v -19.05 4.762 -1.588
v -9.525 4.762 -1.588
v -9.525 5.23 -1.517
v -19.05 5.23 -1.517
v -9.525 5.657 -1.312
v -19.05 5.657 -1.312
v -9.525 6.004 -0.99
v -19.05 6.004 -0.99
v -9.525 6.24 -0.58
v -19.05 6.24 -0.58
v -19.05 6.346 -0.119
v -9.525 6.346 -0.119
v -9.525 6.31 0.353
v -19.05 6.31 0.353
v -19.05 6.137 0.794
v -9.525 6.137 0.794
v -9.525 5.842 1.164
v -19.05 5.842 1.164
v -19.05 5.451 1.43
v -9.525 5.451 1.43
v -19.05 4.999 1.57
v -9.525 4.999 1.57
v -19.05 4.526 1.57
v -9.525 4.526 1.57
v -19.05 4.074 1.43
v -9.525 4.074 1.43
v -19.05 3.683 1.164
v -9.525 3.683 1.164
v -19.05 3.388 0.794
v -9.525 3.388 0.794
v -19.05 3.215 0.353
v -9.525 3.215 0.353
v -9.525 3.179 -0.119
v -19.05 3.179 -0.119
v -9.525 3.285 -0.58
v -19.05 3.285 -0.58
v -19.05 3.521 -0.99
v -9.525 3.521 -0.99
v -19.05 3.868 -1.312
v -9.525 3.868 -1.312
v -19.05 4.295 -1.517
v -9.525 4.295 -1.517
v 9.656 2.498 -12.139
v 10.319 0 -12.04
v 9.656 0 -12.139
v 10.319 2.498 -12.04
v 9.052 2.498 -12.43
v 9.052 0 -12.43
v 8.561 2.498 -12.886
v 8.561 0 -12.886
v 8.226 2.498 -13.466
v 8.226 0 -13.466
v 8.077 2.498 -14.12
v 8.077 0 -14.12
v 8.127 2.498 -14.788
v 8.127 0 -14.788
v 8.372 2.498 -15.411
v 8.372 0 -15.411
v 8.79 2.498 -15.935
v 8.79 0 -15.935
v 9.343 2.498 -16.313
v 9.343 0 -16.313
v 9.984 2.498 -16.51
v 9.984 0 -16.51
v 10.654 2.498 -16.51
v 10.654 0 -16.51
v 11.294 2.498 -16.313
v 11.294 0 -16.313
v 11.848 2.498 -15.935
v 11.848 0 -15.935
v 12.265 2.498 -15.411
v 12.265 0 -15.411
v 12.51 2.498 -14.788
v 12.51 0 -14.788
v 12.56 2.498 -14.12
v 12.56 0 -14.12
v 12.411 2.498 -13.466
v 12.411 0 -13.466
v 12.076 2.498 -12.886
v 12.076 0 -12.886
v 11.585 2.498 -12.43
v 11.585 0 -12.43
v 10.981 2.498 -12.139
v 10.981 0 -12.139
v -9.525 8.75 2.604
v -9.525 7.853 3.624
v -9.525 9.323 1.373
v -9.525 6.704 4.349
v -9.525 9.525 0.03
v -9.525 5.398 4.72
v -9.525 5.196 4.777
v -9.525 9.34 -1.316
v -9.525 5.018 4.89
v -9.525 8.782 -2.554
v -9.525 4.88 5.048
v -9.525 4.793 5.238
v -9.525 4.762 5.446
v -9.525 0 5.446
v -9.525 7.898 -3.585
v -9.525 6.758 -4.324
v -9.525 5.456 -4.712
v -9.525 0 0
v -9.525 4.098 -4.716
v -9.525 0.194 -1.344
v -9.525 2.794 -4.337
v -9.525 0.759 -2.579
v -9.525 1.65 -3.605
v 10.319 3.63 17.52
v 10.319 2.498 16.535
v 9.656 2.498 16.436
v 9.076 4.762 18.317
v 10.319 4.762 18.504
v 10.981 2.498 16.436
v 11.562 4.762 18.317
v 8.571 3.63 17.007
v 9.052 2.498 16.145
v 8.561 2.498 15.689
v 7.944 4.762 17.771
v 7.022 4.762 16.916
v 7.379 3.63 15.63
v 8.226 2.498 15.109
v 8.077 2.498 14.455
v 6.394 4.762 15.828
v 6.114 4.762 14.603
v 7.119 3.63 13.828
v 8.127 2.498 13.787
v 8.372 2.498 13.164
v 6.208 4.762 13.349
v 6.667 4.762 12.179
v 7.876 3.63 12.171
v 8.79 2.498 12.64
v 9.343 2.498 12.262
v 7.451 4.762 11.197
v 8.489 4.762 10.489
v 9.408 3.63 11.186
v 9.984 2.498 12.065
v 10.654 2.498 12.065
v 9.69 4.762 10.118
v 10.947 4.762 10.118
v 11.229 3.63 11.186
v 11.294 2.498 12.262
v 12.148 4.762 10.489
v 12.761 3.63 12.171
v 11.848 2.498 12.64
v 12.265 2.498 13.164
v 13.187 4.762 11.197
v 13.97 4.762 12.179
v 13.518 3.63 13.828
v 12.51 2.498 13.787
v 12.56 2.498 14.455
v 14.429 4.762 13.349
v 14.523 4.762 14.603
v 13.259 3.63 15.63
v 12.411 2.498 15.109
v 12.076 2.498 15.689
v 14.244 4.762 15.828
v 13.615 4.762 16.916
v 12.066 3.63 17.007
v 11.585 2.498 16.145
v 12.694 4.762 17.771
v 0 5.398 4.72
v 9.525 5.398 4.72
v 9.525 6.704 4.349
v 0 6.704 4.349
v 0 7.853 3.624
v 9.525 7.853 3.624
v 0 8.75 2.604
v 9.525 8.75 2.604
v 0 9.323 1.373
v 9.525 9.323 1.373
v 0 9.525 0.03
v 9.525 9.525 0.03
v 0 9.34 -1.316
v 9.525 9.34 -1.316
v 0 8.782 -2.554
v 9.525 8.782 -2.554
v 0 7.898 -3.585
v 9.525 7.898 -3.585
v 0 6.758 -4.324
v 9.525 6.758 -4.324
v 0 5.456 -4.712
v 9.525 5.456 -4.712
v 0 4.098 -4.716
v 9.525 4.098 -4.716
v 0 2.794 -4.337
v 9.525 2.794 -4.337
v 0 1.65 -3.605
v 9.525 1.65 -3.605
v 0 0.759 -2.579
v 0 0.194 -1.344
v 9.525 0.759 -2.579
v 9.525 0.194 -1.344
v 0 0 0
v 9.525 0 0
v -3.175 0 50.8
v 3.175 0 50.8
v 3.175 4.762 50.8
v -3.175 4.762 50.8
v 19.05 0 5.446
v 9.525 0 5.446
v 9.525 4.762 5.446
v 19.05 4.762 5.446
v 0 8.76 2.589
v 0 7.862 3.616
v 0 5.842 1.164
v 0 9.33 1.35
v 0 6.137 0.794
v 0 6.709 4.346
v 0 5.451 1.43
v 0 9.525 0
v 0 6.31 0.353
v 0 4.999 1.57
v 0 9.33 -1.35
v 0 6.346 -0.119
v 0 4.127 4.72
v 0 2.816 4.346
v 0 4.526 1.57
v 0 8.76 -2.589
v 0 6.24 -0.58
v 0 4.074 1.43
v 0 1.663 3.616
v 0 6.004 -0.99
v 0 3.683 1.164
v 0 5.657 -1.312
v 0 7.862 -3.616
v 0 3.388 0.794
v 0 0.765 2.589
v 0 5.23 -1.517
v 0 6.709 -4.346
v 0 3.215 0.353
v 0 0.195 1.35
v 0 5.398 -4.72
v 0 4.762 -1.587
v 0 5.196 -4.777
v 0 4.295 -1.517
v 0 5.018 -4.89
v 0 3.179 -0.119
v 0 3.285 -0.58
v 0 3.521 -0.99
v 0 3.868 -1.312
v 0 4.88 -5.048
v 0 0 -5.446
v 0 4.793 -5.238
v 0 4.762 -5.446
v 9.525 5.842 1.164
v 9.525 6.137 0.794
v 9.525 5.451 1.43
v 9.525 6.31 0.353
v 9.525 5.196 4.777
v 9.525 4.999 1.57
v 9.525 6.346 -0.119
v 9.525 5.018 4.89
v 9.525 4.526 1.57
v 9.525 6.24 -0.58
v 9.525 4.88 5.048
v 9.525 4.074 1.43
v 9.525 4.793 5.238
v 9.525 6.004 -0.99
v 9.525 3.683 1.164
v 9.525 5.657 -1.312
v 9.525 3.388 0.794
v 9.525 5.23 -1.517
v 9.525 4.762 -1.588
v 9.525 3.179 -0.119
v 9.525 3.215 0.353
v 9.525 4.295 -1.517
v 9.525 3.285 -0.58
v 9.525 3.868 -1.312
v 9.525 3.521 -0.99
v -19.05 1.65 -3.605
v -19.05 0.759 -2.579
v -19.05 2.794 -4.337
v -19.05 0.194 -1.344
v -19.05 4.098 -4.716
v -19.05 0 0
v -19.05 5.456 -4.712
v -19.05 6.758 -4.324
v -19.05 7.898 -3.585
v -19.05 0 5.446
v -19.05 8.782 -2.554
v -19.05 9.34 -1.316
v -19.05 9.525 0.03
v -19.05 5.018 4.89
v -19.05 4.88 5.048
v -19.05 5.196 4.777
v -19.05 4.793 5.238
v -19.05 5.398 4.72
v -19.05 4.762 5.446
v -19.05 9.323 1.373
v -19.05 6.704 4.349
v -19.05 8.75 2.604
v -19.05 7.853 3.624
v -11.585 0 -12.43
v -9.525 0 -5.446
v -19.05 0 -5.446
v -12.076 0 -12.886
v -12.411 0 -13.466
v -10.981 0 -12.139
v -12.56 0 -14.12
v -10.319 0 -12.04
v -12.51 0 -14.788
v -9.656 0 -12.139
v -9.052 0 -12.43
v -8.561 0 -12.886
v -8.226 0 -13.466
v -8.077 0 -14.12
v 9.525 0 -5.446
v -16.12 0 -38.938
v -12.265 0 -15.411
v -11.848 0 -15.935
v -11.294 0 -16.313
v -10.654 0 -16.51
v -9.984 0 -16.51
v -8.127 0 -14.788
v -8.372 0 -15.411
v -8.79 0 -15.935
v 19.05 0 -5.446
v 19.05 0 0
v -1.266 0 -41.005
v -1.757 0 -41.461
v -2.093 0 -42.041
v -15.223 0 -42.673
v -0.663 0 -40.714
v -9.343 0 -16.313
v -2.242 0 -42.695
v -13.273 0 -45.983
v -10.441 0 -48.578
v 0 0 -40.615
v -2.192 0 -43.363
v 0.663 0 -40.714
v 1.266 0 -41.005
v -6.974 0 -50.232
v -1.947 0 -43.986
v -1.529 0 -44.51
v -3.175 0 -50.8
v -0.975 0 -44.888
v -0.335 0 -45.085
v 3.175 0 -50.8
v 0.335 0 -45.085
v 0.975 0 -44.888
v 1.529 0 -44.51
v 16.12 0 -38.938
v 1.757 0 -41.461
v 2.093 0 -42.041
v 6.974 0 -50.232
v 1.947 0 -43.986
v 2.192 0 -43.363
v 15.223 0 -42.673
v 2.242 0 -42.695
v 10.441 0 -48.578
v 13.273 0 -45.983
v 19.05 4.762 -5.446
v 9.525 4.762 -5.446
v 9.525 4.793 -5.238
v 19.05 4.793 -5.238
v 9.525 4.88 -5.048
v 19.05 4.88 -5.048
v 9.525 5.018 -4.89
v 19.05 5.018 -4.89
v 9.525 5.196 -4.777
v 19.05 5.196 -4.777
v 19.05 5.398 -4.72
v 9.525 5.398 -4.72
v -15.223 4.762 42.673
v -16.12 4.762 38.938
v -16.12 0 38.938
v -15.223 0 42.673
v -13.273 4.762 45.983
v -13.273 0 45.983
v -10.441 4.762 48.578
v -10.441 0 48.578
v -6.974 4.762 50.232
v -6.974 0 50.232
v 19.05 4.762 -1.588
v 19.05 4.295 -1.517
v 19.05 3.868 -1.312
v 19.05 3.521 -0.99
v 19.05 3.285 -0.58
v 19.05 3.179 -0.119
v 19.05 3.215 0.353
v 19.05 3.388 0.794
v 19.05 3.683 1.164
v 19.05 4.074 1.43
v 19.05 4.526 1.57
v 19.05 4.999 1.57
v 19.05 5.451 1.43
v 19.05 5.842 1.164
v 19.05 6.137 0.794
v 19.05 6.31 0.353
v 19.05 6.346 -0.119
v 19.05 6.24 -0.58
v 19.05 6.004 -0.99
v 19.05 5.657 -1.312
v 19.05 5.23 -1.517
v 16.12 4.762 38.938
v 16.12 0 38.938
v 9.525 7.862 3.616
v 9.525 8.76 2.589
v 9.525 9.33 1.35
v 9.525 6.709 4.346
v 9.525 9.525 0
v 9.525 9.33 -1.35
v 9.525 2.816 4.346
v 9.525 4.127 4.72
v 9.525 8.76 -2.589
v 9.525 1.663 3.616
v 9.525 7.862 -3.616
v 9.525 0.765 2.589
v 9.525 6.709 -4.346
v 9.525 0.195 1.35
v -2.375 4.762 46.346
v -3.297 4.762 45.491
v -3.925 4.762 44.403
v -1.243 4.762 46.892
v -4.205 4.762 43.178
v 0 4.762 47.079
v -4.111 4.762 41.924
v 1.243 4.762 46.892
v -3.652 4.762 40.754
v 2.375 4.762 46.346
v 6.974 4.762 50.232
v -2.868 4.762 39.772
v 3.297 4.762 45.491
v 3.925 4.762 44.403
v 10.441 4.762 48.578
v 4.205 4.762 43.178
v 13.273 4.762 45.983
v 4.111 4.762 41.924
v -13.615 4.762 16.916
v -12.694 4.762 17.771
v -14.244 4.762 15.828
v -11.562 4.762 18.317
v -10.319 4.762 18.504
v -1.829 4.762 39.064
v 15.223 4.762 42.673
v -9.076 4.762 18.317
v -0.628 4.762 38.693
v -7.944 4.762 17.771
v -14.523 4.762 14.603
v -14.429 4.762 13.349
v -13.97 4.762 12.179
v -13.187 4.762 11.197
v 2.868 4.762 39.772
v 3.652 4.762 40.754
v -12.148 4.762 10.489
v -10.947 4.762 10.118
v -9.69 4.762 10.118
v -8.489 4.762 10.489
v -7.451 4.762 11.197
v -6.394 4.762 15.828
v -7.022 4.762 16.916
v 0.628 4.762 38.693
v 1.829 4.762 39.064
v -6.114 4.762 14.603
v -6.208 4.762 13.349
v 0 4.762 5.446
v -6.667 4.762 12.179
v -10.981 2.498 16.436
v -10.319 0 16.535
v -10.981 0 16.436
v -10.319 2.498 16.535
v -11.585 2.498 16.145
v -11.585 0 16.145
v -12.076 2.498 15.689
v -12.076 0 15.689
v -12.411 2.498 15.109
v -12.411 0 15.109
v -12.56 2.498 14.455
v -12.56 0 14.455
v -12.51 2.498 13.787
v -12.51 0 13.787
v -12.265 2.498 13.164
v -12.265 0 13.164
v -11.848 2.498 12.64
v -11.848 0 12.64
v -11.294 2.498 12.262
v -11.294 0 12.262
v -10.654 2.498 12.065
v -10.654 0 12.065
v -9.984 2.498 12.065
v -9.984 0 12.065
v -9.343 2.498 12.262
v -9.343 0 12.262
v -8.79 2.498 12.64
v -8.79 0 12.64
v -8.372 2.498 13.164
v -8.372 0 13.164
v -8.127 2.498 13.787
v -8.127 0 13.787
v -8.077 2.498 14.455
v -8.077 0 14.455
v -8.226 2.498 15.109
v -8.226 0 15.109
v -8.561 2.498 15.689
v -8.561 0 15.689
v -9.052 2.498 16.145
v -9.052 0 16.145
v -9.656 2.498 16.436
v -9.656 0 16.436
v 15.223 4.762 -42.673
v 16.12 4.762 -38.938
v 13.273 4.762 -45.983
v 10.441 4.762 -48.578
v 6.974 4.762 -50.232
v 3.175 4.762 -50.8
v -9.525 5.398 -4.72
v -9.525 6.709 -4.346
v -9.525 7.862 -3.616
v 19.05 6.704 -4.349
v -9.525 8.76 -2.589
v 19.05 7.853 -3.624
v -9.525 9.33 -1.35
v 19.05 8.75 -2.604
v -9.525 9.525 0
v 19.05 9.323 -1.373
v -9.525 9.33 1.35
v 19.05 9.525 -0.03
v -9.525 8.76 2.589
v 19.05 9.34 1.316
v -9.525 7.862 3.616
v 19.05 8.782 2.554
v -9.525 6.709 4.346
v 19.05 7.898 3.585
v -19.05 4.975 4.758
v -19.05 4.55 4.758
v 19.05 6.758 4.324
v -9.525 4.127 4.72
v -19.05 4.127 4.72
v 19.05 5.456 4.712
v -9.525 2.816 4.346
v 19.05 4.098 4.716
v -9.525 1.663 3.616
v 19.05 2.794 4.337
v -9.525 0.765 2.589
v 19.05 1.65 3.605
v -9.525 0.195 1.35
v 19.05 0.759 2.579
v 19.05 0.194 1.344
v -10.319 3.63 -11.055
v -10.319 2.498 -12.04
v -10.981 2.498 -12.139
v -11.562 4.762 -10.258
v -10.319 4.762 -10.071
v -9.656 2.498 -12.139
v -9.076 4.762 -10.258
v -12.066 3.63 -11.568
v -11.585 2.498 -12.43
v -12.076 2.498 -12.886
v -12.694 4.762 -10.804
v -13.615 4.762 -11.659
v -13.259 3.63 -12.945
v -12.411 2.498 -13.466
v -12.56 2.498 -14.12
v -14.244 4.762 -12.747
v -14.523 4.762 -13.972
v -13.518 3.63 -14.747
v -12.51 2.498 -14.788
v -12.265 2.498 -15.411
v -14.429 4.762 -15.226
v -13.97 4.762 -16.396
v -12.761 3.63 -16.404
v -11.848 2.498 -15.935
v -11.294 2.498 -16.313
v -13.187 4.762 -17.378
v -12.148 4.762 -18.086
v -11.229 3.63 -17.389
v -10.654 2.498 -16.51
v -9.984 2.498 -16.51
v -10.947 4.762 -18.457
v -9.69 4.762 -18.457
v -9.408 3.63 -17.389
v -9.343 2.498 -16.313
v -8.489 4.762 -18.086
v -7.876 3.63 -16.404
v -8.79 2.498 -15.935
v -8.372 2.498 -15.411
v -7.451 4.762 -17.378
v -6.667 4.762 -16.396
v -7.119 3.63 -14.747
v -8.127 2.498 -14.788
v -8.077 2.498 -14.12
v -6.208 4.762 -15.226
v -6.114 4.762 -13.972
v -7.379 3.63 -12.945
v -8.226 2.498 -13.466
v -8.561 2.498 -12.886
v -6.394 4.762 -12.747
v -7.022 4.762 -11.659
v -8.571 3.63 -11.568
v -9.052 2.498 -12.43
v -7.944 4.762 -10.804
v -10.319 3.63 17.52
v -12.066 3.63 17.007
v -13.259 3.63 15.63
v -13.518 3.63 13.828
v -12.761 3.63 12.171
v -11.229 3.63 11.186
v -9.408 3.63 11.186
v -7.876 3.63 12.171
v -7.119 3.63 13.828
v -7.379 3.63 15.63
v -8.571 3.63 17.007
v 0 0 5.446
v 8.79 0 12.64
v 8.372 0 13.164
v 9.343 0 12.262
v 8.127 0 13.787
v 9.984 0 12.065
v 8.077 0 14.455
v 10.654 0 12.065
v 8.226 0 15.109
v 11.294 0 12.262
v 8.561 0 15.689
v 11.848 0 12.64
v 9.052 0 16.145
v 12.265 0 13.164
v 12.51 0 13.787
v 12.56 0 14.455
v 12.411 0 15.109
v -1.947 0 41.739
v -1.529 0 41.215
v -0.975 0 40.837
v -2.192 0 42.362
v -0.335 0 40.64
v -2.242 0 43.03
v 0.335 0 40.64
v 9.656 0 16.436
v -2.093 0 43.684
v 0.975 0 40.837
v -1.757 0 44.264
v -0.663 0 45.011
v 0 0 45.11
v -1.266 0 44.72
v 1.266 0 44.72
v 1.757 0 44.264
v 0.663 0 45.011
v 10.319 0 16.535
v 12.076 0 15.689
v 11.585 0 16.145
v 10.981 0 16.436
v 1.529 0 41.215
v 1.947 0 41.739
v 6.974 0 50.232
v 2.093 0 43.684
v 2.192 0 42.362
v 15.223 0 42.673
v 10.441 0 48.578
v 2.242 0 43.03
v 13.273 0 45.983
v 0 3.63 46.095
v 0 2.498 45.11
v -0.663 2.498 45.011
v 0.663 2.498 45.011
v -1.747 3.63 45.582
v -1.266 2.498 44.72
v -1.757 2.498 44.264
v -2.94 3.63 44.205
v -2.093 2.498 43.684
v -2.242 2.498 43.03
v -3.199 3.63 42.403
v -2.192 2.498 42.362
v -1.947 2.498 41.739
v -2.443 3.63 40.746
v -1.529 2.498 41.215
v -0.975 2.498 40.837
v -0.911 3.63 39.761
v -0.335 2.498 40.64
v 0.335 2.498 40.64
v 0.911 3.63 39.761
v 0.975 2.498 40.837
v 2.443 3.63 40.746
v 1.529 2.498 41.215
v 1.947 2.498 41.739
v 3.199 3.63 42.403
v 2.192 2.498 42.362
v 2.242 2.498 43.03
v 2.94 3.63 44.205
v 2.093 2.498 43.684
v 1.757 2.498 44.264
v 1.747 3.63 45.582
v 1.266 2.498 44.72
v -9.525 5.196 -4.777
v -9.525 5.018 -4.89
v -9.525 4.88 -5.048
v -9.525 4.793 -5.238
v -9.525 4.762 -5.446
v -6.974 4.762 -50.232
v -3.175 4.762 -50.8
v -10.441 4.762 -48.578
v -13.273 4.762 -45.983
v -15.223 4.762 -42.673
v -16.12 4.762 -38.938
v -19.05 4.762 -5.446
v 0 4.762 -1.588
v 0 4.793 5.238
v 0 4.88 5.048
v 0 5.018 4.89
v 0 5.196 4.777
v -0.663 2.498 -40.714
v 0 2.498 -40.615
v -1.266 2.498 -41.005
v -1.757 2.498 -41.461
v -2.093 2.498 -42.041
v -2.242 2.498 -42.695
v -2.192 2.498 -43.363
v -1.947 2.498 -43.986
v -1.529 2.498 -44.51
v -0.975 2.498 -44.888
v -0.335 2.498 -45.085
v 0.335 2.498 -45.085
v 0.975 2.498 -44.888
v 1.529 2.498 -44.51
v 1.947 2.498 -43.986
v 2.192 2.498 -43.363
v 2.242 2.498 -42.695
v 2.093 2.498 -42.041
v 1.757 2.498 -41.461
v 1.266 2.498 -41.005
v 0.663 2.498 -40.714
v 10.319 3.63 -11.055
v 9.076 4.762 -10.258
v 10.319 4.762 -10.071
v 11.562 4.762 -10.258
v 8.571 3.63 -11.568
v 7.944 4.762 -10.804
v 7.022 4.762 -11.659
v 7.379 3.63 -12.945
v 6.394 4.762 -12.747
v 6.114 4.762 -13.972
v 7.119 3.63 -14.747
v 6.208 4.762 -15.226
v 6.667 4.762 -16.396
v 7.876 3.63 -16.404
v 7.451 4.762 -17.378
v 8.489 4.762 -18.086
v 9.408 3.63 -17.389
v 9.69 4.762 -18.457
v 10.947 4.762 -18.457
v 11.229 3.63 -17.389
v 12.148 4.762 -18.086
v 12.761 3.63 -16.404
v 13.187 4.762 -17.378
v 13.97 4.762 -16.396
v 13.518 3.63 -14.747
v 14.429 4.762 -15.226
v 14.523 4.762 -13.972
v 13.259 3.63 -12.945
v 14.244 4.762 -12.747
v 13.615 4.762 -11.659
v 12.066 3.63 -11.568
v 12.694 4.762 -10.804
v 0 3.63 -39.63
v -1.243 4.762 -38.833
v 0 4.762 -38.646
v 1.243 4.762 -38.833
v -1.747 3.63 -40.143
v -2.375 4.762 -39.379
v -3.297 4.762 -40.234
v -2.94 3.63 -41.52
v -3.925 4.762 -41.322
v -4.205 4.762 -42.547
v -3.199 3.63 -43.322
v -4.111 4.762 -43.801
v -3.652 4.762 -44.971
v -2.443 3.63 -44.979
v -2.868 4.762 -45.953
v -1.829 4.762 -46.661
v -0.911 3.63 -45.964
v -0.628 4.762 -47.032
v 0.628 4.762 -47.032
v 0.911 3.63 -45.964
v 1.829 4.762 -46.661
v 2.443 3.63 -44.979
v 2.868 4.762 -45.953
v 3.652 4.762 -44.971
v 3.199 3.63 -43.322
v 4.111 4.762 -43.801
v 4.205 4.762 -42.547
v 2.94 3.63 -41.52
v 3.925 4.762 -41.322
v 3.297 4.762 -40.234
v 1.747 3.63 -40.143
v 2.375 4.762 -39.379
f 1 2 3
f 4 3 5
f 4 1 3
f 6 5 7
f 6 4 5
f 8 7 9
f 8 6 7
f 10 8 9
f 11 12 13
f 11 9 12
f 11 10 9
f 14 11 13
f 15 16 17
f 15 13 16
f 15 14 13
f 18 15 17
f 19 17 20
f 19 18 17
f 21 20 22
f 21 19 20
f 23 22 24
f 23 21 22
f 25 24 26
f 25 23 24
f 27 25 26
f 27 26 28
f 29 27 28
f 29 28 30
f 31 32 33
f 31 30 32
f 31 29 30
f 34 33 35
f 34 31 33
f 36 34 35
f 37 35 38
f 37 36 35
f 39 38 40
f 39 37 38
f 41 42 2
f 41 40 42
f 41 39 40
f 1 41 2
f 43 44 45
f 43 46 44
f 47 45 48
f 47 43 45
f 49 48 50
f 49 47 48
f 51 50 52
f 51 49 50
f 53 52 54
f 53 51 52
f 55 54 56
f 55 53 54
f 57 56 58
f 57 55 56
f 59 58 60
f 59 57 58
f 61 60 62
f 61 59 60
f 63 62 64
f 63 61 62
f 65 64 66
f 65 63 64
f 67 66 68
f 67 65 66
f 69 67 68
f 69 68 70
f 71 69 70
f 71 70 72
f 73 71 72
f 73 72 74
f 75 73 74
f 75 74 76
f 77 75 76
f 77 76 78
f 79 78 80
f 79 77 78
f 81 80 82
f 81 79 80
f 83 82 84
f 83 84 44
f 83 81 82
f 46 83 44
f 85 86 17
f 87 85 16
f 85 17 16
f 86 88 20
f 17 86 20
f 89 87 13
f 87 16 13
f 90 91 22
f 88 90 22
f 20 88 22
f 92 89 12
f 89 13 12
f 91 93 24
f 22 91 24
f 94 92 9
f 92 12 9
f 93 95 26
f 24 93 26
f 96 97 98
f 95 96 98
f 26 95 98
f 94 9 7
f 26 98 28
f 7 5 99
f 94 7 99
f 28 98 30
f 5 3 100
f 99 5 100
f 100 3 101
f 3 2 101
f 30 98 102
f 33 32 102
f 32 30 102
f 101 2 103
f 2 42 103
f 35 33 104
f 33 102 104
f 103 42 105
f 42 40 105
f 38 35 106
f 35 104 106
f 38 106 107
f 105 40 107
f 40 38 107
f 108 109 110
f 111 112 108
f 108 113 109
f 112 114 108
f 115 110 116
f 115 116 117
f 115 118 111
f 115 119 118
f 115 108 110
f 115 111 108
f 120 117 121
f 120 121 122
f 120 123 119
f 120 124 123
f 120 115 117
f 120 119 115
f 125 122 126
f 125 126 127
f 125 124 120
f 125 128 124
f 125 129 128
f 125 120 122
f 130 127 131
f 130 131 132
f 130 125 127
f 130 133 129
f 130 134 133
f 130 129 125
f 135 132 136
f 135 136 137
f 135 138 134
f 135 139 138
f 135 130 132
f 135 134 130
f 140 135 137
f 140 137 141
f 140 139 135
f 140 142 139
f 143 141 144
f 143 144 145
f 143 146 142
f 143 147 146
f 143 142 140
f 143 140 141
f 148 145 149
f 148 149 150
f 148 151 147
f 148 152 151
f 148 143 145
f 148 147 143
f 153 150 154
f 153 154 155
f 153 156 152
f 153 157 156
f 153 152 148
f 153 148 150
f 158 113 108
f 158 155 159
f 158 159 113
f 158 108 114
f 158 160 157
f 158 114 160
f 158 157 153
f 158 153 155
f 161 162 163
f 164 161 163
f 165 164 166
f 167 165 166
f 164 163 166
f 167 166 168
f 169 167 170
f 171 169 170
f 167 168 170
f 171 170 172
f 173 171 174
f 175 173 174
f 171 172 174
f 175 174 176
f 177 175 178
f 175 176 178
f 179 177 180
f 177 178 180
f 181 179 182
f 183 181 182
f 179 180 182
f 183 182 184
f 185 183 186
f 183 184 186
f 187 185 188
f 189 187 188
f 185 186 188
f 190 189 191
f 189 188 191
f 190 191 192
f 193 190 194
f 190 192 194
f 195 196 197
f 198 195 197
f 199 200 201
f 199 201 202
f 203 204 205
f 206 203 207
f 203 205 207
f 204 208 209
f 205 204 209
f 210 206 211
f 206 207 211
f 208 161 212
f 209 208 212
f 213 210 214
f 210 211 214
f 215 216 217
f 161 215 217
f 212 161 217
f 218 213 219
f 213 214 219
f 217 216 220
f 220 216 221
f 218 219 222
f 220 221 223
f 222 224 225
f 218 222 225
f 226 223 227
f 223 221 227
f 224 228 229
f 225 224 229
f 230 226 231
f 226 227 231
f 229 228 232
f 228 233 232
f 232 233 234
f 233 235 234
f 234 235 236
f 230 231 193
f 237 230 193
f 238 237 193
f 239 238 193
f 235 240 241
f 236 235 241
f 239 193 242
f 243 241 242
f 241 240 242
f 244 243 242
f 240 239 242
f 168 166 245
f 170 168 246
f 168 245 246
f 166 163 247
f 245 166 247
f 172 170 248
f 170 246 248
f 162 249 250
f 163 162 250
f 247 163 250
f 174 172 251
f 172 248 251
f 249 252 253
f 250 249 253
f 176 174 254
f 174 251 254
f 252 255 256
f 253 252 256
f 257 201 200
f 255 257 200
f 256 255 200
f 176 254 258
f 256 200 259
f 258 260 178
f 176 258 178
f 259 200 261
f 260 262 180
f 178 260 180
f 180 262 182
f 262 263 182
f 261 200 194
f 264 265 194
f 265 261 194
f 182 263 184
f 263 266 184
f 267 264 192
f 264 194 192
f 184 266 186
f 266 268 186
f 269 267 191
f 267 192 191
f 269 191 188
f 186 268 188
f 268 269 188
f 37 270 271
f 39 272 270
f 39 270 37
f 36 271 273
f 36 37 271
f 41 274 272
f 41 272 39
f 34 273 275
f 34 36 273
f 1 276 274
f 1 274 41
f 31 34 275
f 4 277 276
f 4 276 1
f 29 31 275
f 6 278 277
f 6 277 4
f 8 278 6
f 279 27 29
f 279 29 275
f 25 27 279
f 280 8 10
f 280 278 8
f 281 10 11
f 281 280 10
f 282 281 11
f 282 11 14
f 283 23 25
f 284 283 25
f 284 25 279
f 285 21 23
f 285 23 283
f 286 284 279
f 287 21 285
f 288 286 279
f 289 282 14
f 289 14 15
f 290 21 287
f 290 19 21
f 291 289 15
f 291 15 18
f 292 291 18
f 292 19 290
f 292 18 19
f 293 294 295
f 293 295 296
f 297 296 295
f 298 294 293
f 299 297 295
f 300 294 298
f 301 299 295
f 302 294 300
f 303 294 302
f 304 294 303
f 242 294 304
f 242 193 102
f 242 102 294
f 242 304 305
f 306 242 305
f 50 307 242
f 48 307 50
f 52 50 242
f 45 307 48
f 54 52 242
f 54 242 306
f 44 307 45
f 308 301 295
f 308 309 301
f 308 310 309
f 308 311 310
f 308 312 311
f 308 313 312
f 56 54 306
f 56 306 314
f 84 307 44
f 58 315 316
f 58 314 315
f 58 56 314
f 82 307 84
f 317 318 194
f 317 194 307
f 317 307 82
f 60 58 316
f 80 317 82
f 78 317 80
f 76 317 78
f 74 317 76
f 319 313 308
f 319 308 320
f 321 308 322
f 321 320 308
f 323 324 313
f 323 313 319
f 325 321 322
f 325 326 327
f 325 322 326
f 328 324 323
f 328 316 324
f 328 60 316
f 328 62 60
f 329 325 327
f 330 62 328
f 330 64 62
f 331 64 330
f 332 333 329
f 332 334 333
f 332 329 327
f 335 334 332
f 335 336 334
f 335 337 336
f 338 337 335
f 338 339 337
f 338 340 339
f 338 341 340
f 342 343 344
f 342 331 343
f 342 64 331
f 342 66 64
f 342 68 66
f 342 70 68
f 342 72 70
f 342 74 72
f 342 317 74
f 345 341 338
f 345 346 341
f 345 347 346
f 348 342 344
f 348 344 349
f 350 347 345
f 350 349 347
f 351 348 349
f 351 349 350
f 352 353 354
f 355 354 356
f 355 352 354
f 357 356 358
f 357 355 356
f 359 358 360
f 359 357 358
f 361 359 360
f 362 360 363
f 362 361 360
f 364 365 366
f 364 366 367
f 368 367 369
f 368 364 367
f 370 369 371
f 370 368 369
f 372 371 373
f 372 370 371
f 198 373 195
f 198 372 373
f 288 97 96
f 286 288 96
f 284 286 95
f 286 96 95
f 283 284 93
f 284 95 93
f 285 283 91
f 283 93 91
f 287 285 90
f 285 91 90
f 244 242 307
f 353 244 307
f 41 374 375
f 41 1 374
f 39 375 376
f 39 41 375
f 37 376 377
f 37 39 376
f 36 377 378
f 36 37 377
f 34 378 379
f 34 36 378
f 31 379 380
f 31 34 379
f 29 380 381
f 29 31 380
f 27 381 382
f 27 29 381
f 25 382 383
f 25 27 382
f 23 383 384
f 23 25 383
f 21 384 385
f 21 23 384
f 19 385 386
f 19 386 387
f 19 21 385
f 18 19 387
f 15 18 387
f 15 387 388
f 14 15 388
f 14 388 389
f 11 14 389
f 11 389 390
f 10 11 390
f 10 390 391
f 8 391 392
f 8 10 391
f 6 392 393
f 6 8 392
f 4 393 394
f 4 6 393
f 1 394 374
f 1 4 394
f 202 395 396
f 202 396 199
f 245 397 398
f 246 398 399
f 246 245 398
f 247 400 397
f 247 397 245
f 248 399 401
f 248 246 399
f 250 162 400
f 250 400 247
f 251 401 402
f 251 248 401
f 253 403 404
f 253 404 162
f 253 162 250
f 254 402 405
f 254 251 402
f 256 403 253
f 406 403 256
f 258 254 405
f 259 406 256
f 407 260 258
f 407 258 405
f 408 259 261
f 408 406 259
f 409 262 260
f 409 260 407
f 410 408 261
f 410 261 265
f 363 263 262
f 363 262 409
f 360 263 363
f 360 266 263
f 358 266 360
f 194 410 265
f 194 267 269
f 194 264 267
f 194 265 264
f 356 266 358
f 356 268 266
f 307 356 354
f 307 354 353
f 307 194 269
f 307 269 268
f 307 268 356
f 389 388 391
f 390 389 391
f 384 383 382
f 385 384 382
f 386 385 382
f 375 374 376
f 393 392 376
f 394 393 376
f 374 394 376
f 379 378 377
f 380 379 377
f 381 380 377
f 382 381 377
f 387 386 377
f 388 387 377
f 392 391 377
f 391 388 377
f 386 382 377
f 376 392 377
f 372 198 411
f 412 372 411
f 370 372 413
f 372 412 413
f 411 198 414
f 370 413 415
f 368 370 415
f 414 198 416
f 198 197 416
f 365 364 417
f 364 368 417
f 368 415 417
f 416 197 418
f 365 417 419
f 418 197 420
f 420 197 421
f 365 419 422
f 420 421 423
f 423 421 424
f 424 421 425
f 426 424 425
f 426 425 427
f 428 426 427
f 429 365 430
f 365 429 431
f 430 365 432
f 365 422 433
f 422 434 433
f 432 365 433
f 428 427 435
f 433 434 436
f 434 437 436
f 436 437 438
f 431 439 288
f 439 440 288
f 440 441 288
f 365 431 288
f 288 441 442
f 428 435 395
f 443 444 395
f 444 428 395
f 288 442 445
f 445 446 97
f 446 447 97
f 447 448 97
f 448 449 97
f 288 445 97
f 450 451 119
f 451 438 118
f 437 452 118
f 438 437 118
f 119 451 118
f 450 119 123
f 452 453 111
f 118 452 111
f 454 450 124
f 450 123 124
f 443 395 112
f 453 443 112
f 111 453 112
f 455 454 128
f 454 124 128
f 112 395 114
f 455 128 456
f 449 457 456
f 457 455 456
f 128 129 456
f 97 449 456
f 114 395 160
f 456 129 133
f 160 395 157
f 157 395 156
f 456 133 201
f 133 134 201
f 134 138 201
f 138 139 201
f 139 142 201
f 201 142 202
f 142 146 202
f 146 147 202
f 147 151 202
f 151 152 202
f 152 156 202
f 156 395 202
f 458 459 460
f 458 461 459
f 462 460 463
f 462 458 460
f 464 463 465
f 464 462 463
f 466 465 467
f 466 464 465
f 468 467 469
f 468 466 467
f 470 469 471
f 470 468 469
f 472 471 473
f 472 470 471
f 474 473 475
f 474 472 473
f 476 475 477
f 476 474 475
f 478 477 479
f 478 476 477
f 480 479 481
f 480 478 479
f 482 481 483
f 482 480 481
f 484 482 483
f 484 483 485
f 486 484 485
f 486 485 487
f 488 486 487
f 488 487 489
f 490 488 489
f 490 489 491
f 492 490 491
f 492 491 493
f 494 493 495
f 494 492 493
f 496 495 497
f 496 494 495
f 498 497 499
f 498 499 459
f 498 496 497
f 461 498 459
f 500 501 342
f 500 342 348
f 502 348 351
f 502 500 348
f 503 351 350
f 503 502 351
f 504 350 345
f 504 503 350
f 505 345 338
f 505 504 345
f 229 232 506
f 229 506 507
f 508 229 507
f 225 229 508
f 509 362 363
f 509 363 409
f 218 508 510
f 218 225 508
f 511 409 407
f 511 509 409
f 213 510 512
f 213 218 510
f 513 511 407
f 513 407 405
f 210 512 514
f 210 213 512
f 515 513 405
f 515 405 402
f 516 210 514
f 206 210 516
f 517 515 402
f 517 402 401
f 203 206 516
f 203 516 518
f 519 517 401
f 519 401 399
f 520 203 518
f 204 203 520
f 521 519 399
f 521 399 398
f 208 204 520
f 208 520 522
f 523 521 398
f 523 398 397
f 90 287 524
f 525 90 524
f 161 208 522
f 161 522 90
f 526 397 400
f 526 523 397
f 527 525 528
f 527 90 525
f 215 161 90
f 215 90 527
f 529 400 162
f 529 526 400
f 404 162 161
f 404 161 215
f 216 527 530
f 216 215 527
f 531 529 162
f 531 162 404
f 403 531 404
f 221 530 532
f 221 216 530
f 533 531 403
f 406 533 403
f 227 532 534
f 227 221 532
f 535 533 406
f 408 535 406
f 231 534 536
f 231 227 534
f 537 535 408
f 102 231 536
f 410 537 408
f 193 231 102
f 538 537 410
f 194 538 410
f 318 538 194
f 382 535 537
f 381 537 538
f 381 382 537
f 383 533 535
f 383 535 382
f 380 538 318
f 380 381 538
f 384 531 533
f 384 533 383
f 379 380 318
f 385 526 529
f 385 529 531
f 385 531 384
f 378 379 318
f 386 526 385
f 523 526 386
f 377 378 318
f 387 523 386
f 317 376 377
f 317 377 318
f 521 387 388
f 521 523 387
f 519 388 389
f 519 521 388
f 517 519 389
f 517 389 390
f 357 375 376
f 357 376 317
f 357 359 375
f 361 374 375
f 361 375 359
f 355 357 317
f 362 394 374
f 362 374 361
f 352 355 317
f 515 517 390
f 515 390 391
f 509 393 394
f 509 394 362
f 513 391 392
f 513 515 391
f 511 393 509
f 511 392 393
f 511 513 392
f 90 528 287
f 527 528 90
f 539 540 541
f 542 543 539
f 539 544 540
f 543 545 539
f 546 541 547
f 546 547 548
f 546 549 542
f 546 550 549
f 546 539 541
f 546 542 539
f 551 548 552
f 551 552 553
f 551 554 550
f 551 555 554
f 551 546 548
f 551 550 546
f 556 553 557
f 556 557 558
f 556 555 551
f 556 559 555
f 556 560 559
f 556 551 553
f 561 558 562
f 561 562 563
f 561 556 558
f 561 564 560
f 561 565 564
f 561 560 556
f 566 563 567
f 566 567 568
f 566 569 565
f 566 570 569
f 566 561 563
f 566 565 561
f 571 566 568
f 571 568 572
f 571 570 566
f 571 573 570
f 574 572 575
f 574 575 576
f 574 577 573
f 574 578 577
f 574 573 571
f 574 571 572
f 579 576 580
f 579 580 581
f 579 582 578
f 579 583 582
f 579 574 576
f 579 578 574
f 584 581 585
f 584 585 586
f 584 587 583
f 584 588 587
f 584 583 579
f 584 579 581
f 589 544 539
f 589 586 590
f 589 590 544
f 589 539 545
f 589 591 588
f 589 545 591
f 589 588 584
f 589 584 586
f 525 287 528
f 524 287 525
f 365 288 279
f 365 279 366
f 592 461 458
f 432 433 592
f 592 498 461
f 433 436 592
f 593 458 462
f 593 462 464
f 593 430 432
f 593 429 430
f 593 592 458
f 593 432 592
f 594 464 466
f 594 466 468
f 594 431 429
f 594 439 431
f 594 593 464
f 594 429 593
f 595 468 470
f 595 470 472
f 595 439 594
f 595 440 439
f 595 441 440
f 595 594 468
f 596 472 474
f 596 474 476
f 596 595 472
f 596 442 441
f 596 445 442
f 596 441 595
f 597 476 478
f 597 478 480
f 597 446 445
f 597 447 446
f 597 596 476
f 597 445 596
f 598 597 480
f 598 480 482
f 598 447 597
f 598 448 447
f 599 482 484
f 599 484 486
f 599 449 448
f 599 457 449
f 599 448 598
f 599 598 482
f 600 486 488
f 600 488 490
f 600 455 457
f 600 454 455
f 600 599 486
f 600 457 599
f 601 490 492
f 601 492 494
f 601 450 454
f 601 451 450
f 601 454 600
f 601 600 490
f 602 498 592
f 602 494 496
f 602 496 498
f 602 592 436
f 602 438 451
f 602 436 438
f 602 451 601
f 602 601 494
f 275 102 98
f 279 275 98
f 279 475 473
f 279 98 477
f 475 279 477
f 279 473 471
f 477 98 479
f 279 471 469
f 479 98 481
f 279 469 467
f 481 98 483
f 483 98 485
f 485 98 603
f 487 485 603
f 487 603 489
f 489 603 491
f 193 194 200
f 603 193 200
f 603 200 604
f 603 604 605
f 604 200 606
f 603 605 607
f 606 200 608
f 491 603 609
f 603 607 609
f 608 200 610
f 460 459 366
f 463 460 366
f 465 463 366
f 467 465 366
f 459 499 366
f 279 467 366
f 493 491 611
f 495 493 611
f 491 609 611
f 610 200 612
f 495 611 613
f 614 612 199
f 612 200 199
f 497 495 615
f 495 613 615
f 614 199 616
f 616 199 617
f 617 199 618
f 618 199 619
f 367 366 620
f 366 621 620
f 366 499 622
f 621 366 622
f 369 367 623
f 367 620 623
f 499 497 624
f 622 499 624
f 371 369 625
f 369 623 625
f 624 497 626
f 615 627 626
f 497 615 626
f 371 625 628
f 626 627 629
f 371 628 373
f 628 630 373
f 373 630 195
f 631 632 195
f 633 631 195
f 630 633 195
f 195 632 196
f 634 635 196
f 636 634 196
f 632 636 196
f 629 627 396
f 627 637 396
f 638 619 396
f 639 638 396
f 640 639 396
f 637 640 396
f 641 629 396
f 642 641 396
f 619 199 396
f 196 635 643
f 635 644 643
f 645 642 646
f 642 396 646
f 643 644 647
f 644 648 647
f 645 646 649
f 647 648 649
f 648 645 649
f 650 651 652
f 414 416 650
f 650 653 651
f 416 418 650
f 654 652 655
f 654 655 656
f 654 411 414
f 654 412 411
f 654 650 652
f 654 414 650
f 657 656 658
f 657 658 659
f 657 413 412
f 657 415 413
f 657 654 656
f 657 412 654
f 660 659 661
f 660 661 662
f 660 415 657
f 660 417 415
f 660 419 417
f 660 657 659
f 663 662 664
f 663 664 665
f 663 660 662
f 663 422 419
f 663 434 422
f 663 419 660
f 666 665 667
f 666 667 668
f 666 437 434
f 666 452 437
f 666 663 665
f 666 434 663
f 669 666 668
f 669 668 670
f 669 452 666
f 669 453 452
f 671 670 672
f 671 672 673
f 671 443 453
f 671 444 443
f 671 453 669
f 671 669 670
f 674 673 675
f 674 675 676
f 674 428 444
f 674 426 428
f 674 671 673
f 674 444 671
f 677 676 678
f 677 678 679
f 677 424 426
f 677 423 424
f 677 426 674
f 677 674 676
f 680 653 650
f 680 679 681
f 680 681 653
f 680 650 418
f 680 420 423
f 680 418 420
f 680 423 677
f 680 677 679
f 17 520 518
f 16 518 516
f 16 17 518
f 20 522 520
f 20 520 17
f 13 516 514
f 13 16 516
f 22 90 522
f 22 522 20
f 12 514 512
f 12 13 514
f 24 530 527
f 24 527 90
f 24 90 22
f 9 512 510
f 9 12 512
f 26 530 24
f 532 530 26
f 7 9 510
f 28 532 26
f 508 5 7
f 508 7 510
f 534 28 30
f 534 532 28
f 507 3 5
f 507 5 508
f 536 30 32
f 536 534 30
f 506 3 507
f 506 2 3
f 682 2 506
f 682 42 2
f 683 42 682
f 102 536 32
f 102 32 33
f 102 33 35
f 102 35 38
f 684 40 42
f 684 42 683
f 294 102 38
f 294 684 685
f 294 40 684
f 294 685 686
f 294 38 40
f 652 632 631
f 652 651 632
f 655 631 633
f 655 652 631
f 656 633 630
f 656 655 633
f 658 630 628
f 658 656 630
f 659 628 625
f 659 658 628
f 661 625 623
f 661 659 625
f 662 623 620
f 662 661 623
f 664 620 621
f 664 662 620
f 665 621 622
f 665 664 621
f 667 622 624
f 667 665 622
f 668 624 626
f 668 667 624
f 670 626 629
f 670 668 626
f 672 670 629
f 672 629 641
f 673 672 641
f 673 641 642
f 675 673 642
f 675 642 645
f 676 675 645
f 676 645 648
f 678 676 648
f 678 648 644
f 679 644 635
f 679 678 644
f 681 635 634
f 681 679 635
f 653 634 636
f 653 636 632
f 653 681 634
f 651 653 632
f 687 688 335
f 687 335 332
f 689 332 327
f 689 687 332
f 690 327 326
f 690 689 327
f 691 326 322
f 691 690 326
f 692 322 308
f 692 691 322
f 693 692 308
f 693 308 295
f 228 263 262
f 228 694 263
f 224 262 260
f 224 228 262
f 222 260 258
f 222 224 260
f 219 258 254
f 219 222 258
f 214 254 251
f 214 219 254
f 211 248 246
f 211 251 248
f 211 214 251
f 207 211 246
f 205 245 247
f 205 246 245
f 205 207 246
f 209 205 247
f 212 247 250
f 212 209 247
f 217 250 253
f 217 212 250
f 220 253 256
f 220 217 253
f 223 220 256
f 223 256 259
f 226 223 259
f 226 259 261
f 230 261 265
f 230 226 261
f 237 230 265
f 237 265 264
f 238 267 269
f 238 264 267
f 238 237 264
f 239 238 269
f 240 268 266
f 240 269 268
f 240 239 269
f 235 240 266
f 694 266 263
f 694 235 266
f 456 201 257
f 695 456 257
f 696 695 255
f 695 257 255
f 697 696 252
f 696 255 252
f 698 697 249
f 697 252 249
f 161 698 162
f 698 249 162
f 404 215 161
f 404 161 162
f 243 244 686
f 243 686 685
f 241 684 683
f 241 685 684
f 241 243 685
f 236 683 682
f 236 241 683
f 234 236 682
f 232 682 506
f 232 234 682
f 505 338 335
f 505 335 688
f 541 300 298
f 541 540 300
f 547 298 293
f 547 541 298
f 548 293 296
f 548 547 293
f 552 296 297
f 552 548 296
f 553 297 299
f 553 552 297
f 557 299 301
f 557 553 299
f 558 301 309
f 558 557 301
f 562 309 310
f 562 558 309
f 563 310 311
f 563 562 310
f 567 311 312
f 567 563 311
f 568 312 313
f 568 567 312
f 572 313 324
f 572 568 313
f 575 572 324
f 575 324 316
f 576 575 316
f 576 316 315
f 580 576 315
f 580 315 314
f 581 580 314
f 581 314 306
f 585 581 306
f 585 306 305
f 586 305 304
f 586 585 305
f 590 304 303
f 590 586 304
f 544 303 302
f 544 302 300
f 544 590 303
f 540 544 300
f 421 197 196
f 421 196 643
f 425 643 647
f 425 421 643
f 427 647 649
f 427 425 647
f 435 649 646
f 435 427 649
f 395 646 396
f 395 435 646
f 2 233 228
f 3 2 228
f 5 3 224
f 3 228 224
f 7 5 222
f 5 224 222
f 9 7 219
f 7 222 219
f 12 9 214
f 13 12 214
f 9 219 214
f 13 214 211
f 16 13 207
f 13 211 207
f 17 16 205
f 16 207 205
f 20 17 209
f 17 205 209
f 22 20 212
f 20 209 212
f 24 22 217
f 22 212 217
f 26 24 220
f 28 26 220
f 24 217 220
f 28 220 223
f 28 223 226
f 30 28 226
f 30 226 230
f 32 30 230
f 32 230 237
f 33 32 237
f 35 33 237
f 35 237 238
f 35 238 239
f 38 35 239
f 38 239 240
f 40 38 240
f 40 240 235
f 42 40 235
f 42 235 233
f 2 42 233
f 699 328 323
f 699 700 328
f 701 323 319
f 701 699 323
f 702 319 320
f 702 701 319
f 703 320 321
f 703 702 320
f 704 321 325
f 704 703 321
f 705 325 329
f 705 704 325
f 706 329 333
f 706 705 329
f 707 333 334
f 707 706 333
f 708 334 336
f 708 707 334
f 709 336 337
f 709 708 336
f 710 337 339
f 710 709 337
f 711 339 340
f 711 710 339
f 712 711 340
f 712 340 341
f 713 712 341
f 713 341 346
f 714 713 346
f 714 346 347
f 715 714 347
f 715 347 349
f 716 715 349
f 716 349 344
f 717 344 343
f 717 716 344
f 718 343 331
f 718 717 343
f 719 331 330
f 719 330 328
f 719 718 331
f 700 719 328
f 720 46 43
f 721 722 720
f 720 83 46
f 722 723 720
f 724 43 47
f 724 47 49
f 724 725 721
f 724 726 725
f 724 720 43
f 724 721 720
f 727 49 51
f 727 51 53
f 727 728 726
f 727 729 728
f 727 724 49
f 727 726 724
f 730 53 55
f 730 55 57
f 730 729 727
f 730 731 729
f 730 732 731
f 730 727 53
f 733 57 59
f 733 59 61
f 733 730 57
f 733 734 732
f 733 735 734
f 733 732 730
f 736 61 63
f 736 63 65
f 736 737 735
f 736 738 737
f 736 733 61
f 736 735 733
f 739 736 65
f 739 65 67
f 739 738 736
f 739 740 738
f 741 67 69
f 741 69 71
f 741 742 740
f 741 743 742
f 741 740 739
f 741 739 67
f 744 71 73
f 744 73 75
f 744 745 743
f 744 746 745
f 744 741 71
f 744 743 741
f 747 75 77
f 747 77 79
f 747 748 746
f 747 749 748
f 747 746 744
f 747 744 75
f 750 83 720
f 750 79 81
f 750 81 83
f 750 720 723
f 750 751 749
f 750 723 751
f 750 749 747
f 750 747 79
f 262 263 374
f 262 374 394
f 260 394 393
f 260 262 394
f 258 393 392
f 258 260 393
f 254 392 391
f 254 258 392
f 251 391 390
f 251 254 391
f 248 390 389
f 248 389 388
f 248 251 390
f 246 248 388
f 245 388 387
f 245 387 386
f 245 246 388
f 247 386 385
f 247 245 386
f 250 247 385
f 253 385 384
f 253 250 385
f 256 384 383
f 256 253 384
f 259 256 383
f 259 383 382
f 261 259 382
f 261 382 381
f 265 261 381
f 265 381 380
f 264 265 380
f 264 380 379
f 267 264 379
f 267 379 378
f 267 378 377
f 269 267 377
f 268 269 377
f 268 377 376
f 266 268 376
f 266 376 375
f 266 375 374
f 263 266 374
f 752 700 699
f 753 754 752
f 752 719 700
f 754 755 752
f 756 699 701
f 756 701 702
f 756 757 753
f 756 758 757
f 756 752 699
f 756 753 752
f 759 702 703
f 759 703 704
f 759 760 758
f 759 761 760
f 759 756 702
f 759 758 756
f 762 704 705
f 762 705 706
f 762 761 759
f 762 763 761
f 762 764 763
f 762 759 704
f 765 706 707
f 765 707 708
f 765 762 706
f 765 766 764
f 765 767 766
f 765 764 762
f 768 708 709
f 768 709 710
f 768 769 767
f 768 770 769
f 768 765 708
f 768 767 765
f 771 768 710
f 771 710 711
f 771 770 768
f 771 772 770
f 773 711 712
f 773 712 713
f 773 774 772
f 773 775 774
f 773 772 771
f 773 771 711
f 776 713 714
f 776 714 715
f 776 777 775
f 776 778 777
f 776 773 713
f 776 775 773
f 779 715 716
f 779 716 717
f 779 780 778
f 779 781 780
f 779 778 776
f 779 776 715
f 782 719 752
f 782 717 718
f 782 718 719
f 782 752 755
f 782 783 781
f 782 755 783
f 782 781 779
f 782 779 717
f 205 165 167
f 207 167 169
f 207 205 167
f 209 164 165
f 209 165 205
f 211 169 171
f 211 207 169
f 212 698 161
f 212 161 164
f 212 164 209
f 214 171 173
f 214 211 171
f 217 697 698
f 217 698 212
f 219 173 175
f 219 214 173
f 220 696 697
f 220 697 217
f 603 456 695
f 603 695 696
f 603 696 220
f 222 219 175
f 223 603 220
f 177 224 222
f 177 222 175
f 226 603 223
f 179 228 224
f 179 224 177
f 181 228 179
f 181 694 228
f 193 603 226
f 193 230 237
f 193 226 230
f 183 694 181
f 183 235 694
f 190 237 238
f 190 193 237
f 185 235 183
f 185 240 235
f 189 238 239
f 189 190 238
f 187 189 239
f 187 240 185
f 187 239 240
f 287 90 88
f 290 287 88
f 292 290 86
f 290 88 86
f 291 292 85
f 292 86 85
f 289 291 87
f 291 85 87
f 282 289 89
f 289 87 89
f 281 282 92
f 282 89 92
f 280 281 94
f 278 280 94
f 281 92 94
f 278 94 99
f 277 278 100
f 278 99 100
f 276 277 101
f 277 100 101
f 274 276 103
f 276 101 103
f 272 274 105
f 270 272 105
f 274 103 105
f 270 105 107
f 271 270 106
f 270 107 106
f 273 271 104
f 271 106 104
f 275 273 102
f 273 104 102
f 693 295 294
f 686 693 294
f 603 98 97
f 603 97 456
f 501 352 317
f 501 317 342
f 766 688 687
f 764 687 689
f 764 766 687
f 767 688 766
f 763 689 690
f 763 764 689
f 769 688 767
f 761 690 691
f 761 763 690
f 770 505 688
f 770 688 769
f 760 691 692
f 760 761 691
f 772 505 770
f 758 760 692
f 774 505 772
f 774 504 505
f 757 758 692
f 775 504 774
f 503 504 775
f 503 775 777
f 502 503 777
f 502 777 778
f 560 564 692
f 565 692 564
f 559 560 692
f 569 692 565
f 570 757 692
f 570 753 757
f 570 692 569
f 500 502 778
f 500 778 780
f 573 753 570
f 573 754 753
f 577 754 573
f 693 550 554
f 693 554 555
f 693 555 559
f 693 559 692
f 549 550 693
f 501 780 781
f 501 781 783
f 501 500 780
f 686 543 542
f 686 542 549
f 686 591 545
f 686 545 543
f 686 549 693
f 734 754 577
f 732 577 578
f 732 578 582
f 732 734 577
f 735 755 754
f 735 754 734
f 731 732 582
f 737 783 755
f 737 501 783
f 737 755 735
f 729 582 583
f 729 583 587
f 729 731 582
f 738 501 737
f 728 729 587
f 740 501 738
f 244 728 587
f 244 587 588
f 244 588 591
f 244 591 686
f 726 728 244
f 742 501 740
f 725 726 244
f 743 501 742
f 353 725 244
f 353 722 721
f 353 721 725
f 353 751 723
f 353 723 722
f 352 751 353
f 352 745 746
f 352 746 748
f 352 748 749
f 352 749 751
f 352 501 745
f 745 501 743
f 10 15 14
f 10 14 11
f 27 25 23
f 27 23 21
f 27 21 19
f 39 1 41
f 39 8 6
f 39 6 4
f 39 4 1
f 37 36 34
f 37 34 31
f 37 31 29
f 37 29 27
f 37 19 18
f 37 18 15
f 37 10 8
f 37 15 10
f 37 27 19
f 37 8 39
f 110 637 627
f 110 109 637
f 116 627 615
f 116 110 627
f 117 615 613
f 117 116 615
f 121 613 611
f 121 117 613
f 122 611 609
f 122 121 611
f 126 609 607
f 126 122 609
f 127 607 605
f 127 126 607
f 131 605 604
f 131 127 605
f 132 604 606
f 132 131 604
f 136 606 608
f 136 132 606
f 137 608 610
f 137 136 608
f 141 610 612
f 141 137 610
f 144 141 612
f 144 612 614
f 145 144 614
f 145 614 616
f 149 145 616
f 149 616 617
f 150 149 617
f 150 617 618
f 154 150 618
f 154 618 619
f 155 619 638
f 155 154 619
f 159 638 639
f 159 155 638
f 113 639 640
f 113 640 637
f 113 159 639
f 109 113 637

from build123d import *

# Parameters (mm, degrees)
SKETCH2_R                                     = 1.5875
EXTRUDE1_DEPTH                                = 19.05
SKETCH24_W                                    = 9.525
SKETCH24_H                                    = 10.208627108
CUT_EXTRUDE5_DEPTH                            = 10.525
SKETCH4_R                                     = 1.5875
EXTRUDE2_DEPTH                                = 19.05
EXTRUDE2_DEPTH_BACK                           = 19.05
SKETCH25_W                                    = 9.525
SKETCH25_H                                    = 10.166103935
CUT_EXTRUDE6_DEPTH                            = 10.525
SKETCH7_W                                     = 38.1
SKETCH7_H                                     = 1.5875
CUT_EXTRUDE4_DEPTH                            = 1056.132
CSK_FOR_8_FLAT_HEAD_MACHINE_SCREW1_AT_2_COUNT = 2
CSK_FOR_8_FLAT_HEAD_MACHINE_SCREW1_AT_2_PITCH = 30.381033994
CSK_FOR_8_FLAT_HEAD_MACHINE_SCREW1_AT_3_COUNT = 2
CSK_FOR_8_FLAT_HEAD_MACHINE_SCREW1_AT_3_PITCH = 30.381033994
CSK_FOR_8_FLAT_HEAD_MACHINE_SCREW1_AT_4_COUNT = 2
CSK_FOR_8_FLAT_HEAD_MACHINE_SCREW1_AT_4_PITCH = 58.074082873
CSK_FOR_8_FLAT_HEAD_MACHINE_SCREW1_AT_5_COUNT = 2
CSK_FOR_8_FLAT_HEAD_MACHINE_SCREW1_AT_5_PITCH = 58.074082873
CSK_FOR_8_FLAT_HEAD_MACHINE_SCREW1_AT_6_COUNT = 2
CSK_FOR_8_FLAT_HEAD_MACHINE_SCREW1_AT_6_PITCH = 85.725


with BuildPart() as part:
    # Sketch2 → Extrude1 (new body, symmetric)
    with BuildSketch(Plane(origin=(0, 0, 0), x_dir=(0, 0, -1), z_dir=(1, 0, 0))):
        with BuildLine():
            Line((0, 0), (-50.8, 0))
            Line((-50.8, 0), (-50.8, 4.7625))
            Line((-50.8, 4.7625), (-5.446127108, 4.7625))
            ThreePointArc((-5.446127108, 4.7625), (-4.963809985, 4.943641576), (-4.719976827, 5.3975))
            ThreePointArc((-4.719976827, 5.3975), (3.585079759, 7.897561303), (0, 0))
        make_face()
        with Locations((0, 4.7625)):
            Circle(SKETCH2_R, mode=Mode.SUBTRACT)
    extrude(amount=EXTRUDE1_DEPTH, both=True)

    # Sketch24 → Cut-Extrude5 (cut, through all)
    with BuildSketch(Plane(origin=(0, 0, 0), x_dir=(1, 0, 0), z_dir=(0, 1, 0))):
        with Locations((-4.7625, -0.341813554)):
            Rectangle(SKETCH24_W, SKETCH24_H)
        with Locations((14.2875, -0.341813554)):
            Rectangle(SKETCH24_W, SKETCH24_H)
    extrude(amount=CUT_EXTRUDE5_DEPTH, mode=Mode.SUBTRACT)


with BuildPart() as body_2:
    # Sketch4 → Extrude2 (new body, two sides)
    with BuildSketch(Plane(origin=(0, 0, 0), x_dir=(0, 0, -1), z_dir=(1, 0, 0))) as extrude2_sk:
        with BuildLine():
            Line((0, 0), (50.8, 0))
            Line((50.8, 0), (50.8, 4.7625))
            Line((50.8, 4.7625), (5.446127108, 4.7625))
            ThreePointArc((5.446127108, 4.7625), (4.963809985, 4.943641576), (4.719976827, 5.3975))
            ThreePointArc((4.719976827, 5.3975), (-3.585079759, 7.897561303), (0, 0))
        make_face()
        with Locations((0, 4.7625)):
            Circle(SKETCH4_R, mode=Mode.SUBTRACT)
    extrude(amount=EXTRUDE2_DEPTH)
    extrude(extrude2_sk.sketch, amount=-EXTRUDE2_DEPTH_BACK)

    # Sketch25 → Cut-Extrude6 (cut, through all)
    with BuildSketch(Plane(origin=(0, 0, 0), x_dir=(1, 0, 0), z_dir=(0, 1, 0))):
        with Locations((-14.2875, 0.363075141)):
            Rectangle(SKETCH25_W, SKETCH25_H)
        with Locations((4.7625, 0.363075141)):
            Rectangle(SKETCH25_W, SKETCH25_H)
    extrude(amount=CUT_EXTRUDE6_DEPTH, mode=Mode.SUBTRACT)


with BuildPart() as body_3:
    # Sketch7 → Revolve1 (revolve)
    with BuildSketch(Plane(origin=(0, 4.7625, 0), x_dir=(-1, 0, 0), z_dir=(0, 1, 0))):
        with Locations((0, -0.79375)):
            Rectangle(SKETCH7_W, SKETCH7_H)
    revolve(axis=Axis((19.05, 4.7625, 0), (-1, 0, 0)))


with BuildPart() as cut_extrude4_tool:
    # Sketch8 → Cut-Extrude4 (new body)
    with BuildSketch(Plane(origin=(0, 4.7625, 0), x_dir=(-1, 0, 0), z_dir=(0, 1, 0))):
        with BuildLine():
            Line((-19.05, -5.446127108), (-16.119818086, -38.938259646))
            ThreePointArc((-16.119818086, -38.938259646), (-11.953798316, -47.386112044), (-3.175, -50.8))
            Line((-3.175, -50.8), (3.175, -50.8))
            ThreePointArc((3.175, -50.8), (11.953798316, -47.386112044), (16.119818086, -38.938259646))
            Line((16.119818086, -38.938259646), (19.05, -5.446127108))
            Line((19.05, -5.446127108), (22.119129983, -5.446127108))
            Line((22.119129983, -5.446127108), (22.119129983, -53.464086311))
            Line((22.119129983, -53.464086311), (-22.119129983, -53.464086311))
            Line((-22.119129983, -53.464086311), (-22.119129983, -5.446127108))
            Line((-22.119129983, -5.446127108), (-19.05, -5.446127108))
        make_face()
        with BuildLine():
            Line((3.175, 50.8), (-3.175, 50.8))
            ThreePointArc((-3.175, 50.8), (-11.953798316, 47.386112044), (-16.119818086, 38.938259646))
            Line((-16.119818086, 38.938259646), (-19.05, 5.446127108))
            Line((-19.05, 5.446127108), (-22.119129983, 5.446127108))
            Line((-22.119129983, 5.446127108), (-22.119129983, 53.464086311))
            Line((-22.119129983, 53.464086311), (22.119129983, 53.464086311))
            Line((22.119129983, 53.464086311), (22.119129983, 5.446127108))
            Line((22.119129983, 5.446127108), (19.05, 5.446127108))
            Line((19.05, 5.446127108), (16.119818086, 38.938259646))
            ThreePointArc((16.119818086, 38.938259646), (11.953798316, 47.386112044), (3.175, 50.8))
        make_face()
    extrude(amount=-CUT_EXTRUDE4_DEPTH)


with BuildPart() as part_1:
    add(part.part)

    # Cut-Extrude4: cut by cut_extrude4_tool
    add(cut_extrude4_tool.part, mode=Mode.SUBTRACT)


with BuildPart() as body_2_1:
    add(body_2.part)

    # Cut-Extrude4: cut by cut_extrude4_tool
    add(cut_extrude4_tool.part, mode=Mode.SUBTRACT)

    # Sketch13 → CSK for #8 Flat Head Machine Screw1 (revolve, cut)
    with BuildSketch(Plane(origin=(0, 4.7625, -42.8625), x_dir=(0, 0, 1), z_dir=(1, 0, 0))):
        Polygon((0, 0), (0, 4.7625), (2.2479, 4.7625), (2.2479, 2.26450021), (4.2164, 0), align=None)
    csk_for_8_flat_head_machine_screw1 = revolve(axis=Axis((0, 11.1125, -42.8625), (0, -1, 0)), mode=Mode.SUBTRACT)

    # CSK for #8 Flat Head Machine Screw1 at 2: CSK for #8 Flat Head Machine Screw1 ×2
    with Locations(*[Vector(-0.339644464, 0, 0.9405539) * (i * CSK_FOR_8_FLAT_HEAD_MACHINE_SCREW1_AT_2_PITCH) for i in range(1, CSK_FOR_8_FLAT_HEAD_MACHINE_SCREW1_AT_2_COUNT)]):
        add(csk_for_8_flat_head_machine_screw1, mode=Mode.SUBTRACT)

    # CSK for #8 Flat Head Machine Screw1 at 3: CSK for #8 Flat Head Machine Screw1 ×2
    with Locations(*[Vector(0.339644464, 0, 0.9405539) * (i * CSK_FOR_8_FLAT_HEAD_MACHINE_SCREW1_AT_3_PITCH) for i in range(1, CSK_FOR_8_FLAT_HEAD_MACHINE_SCREW1_AT_3_COUNT)]):
        add(csk_for_8_flat_head_machine_screw1, mode=Mode.SUBTRACT)


with BuildPart() as part_2:
    add(part_1.part)

    # CSK for #8 Flat Head Machine Screw1 at 4: CSK for #8 Flat Head Machine Screw1 ×2
    with Locations(*[Vector(-0.17768253, 0, 0.984087861) * (i * CSK_FOR_8_FLAT_HEAD_MACHINE_SCREW1_AT_4_PITCH) for i in range(1, CSK_FOR_8_FLAT_HEAD_MACHINE_SCREW1_AT_4_COUNT)]):
        add(csk_for_8_flat_head_machine_screw1, mode=Mode.SUBTRACT)

    # CSK for #8 Flat Head Machine Screw1 at 5: CSK for #8 Flat Head Machine Screw1 ×2
    with Locations(*[Vector(0.17768253, 0, 0.984087861) * (i * CSK_FOR_8_FLAT_HEAD_MACHINE_SCREW1_AT_5_PITCH) for i in range(1, CSK_FOR_8_FLAT_HEAD_MACHINE_SCREW1_AT_5_COUNT)]):
        add(csk_for_8_flat_head_machine_screw1, mode=Mode.SUBTRACT)

    # CSK for #8 Flat Head Machine Screw1 at 6: CSK for #8 Flat Head Machine Screw1 ×2
    with Locations(*[(0, 0, i * CSK_FOR_8_FLAT_HEAD_MACHINE_SCREW1_AT_6_PITCH) for i in range(1, CSK_FOR_8_FLAT_HEAD_MACHINE_SCREW1_AT_6_COUNT)]):
        add(csk_for_8_flat_head_machine_screw1, mode=Mode.SUBTRACT)


solid = Compound([body_3.part, body_2_1.part, part_2.part])
